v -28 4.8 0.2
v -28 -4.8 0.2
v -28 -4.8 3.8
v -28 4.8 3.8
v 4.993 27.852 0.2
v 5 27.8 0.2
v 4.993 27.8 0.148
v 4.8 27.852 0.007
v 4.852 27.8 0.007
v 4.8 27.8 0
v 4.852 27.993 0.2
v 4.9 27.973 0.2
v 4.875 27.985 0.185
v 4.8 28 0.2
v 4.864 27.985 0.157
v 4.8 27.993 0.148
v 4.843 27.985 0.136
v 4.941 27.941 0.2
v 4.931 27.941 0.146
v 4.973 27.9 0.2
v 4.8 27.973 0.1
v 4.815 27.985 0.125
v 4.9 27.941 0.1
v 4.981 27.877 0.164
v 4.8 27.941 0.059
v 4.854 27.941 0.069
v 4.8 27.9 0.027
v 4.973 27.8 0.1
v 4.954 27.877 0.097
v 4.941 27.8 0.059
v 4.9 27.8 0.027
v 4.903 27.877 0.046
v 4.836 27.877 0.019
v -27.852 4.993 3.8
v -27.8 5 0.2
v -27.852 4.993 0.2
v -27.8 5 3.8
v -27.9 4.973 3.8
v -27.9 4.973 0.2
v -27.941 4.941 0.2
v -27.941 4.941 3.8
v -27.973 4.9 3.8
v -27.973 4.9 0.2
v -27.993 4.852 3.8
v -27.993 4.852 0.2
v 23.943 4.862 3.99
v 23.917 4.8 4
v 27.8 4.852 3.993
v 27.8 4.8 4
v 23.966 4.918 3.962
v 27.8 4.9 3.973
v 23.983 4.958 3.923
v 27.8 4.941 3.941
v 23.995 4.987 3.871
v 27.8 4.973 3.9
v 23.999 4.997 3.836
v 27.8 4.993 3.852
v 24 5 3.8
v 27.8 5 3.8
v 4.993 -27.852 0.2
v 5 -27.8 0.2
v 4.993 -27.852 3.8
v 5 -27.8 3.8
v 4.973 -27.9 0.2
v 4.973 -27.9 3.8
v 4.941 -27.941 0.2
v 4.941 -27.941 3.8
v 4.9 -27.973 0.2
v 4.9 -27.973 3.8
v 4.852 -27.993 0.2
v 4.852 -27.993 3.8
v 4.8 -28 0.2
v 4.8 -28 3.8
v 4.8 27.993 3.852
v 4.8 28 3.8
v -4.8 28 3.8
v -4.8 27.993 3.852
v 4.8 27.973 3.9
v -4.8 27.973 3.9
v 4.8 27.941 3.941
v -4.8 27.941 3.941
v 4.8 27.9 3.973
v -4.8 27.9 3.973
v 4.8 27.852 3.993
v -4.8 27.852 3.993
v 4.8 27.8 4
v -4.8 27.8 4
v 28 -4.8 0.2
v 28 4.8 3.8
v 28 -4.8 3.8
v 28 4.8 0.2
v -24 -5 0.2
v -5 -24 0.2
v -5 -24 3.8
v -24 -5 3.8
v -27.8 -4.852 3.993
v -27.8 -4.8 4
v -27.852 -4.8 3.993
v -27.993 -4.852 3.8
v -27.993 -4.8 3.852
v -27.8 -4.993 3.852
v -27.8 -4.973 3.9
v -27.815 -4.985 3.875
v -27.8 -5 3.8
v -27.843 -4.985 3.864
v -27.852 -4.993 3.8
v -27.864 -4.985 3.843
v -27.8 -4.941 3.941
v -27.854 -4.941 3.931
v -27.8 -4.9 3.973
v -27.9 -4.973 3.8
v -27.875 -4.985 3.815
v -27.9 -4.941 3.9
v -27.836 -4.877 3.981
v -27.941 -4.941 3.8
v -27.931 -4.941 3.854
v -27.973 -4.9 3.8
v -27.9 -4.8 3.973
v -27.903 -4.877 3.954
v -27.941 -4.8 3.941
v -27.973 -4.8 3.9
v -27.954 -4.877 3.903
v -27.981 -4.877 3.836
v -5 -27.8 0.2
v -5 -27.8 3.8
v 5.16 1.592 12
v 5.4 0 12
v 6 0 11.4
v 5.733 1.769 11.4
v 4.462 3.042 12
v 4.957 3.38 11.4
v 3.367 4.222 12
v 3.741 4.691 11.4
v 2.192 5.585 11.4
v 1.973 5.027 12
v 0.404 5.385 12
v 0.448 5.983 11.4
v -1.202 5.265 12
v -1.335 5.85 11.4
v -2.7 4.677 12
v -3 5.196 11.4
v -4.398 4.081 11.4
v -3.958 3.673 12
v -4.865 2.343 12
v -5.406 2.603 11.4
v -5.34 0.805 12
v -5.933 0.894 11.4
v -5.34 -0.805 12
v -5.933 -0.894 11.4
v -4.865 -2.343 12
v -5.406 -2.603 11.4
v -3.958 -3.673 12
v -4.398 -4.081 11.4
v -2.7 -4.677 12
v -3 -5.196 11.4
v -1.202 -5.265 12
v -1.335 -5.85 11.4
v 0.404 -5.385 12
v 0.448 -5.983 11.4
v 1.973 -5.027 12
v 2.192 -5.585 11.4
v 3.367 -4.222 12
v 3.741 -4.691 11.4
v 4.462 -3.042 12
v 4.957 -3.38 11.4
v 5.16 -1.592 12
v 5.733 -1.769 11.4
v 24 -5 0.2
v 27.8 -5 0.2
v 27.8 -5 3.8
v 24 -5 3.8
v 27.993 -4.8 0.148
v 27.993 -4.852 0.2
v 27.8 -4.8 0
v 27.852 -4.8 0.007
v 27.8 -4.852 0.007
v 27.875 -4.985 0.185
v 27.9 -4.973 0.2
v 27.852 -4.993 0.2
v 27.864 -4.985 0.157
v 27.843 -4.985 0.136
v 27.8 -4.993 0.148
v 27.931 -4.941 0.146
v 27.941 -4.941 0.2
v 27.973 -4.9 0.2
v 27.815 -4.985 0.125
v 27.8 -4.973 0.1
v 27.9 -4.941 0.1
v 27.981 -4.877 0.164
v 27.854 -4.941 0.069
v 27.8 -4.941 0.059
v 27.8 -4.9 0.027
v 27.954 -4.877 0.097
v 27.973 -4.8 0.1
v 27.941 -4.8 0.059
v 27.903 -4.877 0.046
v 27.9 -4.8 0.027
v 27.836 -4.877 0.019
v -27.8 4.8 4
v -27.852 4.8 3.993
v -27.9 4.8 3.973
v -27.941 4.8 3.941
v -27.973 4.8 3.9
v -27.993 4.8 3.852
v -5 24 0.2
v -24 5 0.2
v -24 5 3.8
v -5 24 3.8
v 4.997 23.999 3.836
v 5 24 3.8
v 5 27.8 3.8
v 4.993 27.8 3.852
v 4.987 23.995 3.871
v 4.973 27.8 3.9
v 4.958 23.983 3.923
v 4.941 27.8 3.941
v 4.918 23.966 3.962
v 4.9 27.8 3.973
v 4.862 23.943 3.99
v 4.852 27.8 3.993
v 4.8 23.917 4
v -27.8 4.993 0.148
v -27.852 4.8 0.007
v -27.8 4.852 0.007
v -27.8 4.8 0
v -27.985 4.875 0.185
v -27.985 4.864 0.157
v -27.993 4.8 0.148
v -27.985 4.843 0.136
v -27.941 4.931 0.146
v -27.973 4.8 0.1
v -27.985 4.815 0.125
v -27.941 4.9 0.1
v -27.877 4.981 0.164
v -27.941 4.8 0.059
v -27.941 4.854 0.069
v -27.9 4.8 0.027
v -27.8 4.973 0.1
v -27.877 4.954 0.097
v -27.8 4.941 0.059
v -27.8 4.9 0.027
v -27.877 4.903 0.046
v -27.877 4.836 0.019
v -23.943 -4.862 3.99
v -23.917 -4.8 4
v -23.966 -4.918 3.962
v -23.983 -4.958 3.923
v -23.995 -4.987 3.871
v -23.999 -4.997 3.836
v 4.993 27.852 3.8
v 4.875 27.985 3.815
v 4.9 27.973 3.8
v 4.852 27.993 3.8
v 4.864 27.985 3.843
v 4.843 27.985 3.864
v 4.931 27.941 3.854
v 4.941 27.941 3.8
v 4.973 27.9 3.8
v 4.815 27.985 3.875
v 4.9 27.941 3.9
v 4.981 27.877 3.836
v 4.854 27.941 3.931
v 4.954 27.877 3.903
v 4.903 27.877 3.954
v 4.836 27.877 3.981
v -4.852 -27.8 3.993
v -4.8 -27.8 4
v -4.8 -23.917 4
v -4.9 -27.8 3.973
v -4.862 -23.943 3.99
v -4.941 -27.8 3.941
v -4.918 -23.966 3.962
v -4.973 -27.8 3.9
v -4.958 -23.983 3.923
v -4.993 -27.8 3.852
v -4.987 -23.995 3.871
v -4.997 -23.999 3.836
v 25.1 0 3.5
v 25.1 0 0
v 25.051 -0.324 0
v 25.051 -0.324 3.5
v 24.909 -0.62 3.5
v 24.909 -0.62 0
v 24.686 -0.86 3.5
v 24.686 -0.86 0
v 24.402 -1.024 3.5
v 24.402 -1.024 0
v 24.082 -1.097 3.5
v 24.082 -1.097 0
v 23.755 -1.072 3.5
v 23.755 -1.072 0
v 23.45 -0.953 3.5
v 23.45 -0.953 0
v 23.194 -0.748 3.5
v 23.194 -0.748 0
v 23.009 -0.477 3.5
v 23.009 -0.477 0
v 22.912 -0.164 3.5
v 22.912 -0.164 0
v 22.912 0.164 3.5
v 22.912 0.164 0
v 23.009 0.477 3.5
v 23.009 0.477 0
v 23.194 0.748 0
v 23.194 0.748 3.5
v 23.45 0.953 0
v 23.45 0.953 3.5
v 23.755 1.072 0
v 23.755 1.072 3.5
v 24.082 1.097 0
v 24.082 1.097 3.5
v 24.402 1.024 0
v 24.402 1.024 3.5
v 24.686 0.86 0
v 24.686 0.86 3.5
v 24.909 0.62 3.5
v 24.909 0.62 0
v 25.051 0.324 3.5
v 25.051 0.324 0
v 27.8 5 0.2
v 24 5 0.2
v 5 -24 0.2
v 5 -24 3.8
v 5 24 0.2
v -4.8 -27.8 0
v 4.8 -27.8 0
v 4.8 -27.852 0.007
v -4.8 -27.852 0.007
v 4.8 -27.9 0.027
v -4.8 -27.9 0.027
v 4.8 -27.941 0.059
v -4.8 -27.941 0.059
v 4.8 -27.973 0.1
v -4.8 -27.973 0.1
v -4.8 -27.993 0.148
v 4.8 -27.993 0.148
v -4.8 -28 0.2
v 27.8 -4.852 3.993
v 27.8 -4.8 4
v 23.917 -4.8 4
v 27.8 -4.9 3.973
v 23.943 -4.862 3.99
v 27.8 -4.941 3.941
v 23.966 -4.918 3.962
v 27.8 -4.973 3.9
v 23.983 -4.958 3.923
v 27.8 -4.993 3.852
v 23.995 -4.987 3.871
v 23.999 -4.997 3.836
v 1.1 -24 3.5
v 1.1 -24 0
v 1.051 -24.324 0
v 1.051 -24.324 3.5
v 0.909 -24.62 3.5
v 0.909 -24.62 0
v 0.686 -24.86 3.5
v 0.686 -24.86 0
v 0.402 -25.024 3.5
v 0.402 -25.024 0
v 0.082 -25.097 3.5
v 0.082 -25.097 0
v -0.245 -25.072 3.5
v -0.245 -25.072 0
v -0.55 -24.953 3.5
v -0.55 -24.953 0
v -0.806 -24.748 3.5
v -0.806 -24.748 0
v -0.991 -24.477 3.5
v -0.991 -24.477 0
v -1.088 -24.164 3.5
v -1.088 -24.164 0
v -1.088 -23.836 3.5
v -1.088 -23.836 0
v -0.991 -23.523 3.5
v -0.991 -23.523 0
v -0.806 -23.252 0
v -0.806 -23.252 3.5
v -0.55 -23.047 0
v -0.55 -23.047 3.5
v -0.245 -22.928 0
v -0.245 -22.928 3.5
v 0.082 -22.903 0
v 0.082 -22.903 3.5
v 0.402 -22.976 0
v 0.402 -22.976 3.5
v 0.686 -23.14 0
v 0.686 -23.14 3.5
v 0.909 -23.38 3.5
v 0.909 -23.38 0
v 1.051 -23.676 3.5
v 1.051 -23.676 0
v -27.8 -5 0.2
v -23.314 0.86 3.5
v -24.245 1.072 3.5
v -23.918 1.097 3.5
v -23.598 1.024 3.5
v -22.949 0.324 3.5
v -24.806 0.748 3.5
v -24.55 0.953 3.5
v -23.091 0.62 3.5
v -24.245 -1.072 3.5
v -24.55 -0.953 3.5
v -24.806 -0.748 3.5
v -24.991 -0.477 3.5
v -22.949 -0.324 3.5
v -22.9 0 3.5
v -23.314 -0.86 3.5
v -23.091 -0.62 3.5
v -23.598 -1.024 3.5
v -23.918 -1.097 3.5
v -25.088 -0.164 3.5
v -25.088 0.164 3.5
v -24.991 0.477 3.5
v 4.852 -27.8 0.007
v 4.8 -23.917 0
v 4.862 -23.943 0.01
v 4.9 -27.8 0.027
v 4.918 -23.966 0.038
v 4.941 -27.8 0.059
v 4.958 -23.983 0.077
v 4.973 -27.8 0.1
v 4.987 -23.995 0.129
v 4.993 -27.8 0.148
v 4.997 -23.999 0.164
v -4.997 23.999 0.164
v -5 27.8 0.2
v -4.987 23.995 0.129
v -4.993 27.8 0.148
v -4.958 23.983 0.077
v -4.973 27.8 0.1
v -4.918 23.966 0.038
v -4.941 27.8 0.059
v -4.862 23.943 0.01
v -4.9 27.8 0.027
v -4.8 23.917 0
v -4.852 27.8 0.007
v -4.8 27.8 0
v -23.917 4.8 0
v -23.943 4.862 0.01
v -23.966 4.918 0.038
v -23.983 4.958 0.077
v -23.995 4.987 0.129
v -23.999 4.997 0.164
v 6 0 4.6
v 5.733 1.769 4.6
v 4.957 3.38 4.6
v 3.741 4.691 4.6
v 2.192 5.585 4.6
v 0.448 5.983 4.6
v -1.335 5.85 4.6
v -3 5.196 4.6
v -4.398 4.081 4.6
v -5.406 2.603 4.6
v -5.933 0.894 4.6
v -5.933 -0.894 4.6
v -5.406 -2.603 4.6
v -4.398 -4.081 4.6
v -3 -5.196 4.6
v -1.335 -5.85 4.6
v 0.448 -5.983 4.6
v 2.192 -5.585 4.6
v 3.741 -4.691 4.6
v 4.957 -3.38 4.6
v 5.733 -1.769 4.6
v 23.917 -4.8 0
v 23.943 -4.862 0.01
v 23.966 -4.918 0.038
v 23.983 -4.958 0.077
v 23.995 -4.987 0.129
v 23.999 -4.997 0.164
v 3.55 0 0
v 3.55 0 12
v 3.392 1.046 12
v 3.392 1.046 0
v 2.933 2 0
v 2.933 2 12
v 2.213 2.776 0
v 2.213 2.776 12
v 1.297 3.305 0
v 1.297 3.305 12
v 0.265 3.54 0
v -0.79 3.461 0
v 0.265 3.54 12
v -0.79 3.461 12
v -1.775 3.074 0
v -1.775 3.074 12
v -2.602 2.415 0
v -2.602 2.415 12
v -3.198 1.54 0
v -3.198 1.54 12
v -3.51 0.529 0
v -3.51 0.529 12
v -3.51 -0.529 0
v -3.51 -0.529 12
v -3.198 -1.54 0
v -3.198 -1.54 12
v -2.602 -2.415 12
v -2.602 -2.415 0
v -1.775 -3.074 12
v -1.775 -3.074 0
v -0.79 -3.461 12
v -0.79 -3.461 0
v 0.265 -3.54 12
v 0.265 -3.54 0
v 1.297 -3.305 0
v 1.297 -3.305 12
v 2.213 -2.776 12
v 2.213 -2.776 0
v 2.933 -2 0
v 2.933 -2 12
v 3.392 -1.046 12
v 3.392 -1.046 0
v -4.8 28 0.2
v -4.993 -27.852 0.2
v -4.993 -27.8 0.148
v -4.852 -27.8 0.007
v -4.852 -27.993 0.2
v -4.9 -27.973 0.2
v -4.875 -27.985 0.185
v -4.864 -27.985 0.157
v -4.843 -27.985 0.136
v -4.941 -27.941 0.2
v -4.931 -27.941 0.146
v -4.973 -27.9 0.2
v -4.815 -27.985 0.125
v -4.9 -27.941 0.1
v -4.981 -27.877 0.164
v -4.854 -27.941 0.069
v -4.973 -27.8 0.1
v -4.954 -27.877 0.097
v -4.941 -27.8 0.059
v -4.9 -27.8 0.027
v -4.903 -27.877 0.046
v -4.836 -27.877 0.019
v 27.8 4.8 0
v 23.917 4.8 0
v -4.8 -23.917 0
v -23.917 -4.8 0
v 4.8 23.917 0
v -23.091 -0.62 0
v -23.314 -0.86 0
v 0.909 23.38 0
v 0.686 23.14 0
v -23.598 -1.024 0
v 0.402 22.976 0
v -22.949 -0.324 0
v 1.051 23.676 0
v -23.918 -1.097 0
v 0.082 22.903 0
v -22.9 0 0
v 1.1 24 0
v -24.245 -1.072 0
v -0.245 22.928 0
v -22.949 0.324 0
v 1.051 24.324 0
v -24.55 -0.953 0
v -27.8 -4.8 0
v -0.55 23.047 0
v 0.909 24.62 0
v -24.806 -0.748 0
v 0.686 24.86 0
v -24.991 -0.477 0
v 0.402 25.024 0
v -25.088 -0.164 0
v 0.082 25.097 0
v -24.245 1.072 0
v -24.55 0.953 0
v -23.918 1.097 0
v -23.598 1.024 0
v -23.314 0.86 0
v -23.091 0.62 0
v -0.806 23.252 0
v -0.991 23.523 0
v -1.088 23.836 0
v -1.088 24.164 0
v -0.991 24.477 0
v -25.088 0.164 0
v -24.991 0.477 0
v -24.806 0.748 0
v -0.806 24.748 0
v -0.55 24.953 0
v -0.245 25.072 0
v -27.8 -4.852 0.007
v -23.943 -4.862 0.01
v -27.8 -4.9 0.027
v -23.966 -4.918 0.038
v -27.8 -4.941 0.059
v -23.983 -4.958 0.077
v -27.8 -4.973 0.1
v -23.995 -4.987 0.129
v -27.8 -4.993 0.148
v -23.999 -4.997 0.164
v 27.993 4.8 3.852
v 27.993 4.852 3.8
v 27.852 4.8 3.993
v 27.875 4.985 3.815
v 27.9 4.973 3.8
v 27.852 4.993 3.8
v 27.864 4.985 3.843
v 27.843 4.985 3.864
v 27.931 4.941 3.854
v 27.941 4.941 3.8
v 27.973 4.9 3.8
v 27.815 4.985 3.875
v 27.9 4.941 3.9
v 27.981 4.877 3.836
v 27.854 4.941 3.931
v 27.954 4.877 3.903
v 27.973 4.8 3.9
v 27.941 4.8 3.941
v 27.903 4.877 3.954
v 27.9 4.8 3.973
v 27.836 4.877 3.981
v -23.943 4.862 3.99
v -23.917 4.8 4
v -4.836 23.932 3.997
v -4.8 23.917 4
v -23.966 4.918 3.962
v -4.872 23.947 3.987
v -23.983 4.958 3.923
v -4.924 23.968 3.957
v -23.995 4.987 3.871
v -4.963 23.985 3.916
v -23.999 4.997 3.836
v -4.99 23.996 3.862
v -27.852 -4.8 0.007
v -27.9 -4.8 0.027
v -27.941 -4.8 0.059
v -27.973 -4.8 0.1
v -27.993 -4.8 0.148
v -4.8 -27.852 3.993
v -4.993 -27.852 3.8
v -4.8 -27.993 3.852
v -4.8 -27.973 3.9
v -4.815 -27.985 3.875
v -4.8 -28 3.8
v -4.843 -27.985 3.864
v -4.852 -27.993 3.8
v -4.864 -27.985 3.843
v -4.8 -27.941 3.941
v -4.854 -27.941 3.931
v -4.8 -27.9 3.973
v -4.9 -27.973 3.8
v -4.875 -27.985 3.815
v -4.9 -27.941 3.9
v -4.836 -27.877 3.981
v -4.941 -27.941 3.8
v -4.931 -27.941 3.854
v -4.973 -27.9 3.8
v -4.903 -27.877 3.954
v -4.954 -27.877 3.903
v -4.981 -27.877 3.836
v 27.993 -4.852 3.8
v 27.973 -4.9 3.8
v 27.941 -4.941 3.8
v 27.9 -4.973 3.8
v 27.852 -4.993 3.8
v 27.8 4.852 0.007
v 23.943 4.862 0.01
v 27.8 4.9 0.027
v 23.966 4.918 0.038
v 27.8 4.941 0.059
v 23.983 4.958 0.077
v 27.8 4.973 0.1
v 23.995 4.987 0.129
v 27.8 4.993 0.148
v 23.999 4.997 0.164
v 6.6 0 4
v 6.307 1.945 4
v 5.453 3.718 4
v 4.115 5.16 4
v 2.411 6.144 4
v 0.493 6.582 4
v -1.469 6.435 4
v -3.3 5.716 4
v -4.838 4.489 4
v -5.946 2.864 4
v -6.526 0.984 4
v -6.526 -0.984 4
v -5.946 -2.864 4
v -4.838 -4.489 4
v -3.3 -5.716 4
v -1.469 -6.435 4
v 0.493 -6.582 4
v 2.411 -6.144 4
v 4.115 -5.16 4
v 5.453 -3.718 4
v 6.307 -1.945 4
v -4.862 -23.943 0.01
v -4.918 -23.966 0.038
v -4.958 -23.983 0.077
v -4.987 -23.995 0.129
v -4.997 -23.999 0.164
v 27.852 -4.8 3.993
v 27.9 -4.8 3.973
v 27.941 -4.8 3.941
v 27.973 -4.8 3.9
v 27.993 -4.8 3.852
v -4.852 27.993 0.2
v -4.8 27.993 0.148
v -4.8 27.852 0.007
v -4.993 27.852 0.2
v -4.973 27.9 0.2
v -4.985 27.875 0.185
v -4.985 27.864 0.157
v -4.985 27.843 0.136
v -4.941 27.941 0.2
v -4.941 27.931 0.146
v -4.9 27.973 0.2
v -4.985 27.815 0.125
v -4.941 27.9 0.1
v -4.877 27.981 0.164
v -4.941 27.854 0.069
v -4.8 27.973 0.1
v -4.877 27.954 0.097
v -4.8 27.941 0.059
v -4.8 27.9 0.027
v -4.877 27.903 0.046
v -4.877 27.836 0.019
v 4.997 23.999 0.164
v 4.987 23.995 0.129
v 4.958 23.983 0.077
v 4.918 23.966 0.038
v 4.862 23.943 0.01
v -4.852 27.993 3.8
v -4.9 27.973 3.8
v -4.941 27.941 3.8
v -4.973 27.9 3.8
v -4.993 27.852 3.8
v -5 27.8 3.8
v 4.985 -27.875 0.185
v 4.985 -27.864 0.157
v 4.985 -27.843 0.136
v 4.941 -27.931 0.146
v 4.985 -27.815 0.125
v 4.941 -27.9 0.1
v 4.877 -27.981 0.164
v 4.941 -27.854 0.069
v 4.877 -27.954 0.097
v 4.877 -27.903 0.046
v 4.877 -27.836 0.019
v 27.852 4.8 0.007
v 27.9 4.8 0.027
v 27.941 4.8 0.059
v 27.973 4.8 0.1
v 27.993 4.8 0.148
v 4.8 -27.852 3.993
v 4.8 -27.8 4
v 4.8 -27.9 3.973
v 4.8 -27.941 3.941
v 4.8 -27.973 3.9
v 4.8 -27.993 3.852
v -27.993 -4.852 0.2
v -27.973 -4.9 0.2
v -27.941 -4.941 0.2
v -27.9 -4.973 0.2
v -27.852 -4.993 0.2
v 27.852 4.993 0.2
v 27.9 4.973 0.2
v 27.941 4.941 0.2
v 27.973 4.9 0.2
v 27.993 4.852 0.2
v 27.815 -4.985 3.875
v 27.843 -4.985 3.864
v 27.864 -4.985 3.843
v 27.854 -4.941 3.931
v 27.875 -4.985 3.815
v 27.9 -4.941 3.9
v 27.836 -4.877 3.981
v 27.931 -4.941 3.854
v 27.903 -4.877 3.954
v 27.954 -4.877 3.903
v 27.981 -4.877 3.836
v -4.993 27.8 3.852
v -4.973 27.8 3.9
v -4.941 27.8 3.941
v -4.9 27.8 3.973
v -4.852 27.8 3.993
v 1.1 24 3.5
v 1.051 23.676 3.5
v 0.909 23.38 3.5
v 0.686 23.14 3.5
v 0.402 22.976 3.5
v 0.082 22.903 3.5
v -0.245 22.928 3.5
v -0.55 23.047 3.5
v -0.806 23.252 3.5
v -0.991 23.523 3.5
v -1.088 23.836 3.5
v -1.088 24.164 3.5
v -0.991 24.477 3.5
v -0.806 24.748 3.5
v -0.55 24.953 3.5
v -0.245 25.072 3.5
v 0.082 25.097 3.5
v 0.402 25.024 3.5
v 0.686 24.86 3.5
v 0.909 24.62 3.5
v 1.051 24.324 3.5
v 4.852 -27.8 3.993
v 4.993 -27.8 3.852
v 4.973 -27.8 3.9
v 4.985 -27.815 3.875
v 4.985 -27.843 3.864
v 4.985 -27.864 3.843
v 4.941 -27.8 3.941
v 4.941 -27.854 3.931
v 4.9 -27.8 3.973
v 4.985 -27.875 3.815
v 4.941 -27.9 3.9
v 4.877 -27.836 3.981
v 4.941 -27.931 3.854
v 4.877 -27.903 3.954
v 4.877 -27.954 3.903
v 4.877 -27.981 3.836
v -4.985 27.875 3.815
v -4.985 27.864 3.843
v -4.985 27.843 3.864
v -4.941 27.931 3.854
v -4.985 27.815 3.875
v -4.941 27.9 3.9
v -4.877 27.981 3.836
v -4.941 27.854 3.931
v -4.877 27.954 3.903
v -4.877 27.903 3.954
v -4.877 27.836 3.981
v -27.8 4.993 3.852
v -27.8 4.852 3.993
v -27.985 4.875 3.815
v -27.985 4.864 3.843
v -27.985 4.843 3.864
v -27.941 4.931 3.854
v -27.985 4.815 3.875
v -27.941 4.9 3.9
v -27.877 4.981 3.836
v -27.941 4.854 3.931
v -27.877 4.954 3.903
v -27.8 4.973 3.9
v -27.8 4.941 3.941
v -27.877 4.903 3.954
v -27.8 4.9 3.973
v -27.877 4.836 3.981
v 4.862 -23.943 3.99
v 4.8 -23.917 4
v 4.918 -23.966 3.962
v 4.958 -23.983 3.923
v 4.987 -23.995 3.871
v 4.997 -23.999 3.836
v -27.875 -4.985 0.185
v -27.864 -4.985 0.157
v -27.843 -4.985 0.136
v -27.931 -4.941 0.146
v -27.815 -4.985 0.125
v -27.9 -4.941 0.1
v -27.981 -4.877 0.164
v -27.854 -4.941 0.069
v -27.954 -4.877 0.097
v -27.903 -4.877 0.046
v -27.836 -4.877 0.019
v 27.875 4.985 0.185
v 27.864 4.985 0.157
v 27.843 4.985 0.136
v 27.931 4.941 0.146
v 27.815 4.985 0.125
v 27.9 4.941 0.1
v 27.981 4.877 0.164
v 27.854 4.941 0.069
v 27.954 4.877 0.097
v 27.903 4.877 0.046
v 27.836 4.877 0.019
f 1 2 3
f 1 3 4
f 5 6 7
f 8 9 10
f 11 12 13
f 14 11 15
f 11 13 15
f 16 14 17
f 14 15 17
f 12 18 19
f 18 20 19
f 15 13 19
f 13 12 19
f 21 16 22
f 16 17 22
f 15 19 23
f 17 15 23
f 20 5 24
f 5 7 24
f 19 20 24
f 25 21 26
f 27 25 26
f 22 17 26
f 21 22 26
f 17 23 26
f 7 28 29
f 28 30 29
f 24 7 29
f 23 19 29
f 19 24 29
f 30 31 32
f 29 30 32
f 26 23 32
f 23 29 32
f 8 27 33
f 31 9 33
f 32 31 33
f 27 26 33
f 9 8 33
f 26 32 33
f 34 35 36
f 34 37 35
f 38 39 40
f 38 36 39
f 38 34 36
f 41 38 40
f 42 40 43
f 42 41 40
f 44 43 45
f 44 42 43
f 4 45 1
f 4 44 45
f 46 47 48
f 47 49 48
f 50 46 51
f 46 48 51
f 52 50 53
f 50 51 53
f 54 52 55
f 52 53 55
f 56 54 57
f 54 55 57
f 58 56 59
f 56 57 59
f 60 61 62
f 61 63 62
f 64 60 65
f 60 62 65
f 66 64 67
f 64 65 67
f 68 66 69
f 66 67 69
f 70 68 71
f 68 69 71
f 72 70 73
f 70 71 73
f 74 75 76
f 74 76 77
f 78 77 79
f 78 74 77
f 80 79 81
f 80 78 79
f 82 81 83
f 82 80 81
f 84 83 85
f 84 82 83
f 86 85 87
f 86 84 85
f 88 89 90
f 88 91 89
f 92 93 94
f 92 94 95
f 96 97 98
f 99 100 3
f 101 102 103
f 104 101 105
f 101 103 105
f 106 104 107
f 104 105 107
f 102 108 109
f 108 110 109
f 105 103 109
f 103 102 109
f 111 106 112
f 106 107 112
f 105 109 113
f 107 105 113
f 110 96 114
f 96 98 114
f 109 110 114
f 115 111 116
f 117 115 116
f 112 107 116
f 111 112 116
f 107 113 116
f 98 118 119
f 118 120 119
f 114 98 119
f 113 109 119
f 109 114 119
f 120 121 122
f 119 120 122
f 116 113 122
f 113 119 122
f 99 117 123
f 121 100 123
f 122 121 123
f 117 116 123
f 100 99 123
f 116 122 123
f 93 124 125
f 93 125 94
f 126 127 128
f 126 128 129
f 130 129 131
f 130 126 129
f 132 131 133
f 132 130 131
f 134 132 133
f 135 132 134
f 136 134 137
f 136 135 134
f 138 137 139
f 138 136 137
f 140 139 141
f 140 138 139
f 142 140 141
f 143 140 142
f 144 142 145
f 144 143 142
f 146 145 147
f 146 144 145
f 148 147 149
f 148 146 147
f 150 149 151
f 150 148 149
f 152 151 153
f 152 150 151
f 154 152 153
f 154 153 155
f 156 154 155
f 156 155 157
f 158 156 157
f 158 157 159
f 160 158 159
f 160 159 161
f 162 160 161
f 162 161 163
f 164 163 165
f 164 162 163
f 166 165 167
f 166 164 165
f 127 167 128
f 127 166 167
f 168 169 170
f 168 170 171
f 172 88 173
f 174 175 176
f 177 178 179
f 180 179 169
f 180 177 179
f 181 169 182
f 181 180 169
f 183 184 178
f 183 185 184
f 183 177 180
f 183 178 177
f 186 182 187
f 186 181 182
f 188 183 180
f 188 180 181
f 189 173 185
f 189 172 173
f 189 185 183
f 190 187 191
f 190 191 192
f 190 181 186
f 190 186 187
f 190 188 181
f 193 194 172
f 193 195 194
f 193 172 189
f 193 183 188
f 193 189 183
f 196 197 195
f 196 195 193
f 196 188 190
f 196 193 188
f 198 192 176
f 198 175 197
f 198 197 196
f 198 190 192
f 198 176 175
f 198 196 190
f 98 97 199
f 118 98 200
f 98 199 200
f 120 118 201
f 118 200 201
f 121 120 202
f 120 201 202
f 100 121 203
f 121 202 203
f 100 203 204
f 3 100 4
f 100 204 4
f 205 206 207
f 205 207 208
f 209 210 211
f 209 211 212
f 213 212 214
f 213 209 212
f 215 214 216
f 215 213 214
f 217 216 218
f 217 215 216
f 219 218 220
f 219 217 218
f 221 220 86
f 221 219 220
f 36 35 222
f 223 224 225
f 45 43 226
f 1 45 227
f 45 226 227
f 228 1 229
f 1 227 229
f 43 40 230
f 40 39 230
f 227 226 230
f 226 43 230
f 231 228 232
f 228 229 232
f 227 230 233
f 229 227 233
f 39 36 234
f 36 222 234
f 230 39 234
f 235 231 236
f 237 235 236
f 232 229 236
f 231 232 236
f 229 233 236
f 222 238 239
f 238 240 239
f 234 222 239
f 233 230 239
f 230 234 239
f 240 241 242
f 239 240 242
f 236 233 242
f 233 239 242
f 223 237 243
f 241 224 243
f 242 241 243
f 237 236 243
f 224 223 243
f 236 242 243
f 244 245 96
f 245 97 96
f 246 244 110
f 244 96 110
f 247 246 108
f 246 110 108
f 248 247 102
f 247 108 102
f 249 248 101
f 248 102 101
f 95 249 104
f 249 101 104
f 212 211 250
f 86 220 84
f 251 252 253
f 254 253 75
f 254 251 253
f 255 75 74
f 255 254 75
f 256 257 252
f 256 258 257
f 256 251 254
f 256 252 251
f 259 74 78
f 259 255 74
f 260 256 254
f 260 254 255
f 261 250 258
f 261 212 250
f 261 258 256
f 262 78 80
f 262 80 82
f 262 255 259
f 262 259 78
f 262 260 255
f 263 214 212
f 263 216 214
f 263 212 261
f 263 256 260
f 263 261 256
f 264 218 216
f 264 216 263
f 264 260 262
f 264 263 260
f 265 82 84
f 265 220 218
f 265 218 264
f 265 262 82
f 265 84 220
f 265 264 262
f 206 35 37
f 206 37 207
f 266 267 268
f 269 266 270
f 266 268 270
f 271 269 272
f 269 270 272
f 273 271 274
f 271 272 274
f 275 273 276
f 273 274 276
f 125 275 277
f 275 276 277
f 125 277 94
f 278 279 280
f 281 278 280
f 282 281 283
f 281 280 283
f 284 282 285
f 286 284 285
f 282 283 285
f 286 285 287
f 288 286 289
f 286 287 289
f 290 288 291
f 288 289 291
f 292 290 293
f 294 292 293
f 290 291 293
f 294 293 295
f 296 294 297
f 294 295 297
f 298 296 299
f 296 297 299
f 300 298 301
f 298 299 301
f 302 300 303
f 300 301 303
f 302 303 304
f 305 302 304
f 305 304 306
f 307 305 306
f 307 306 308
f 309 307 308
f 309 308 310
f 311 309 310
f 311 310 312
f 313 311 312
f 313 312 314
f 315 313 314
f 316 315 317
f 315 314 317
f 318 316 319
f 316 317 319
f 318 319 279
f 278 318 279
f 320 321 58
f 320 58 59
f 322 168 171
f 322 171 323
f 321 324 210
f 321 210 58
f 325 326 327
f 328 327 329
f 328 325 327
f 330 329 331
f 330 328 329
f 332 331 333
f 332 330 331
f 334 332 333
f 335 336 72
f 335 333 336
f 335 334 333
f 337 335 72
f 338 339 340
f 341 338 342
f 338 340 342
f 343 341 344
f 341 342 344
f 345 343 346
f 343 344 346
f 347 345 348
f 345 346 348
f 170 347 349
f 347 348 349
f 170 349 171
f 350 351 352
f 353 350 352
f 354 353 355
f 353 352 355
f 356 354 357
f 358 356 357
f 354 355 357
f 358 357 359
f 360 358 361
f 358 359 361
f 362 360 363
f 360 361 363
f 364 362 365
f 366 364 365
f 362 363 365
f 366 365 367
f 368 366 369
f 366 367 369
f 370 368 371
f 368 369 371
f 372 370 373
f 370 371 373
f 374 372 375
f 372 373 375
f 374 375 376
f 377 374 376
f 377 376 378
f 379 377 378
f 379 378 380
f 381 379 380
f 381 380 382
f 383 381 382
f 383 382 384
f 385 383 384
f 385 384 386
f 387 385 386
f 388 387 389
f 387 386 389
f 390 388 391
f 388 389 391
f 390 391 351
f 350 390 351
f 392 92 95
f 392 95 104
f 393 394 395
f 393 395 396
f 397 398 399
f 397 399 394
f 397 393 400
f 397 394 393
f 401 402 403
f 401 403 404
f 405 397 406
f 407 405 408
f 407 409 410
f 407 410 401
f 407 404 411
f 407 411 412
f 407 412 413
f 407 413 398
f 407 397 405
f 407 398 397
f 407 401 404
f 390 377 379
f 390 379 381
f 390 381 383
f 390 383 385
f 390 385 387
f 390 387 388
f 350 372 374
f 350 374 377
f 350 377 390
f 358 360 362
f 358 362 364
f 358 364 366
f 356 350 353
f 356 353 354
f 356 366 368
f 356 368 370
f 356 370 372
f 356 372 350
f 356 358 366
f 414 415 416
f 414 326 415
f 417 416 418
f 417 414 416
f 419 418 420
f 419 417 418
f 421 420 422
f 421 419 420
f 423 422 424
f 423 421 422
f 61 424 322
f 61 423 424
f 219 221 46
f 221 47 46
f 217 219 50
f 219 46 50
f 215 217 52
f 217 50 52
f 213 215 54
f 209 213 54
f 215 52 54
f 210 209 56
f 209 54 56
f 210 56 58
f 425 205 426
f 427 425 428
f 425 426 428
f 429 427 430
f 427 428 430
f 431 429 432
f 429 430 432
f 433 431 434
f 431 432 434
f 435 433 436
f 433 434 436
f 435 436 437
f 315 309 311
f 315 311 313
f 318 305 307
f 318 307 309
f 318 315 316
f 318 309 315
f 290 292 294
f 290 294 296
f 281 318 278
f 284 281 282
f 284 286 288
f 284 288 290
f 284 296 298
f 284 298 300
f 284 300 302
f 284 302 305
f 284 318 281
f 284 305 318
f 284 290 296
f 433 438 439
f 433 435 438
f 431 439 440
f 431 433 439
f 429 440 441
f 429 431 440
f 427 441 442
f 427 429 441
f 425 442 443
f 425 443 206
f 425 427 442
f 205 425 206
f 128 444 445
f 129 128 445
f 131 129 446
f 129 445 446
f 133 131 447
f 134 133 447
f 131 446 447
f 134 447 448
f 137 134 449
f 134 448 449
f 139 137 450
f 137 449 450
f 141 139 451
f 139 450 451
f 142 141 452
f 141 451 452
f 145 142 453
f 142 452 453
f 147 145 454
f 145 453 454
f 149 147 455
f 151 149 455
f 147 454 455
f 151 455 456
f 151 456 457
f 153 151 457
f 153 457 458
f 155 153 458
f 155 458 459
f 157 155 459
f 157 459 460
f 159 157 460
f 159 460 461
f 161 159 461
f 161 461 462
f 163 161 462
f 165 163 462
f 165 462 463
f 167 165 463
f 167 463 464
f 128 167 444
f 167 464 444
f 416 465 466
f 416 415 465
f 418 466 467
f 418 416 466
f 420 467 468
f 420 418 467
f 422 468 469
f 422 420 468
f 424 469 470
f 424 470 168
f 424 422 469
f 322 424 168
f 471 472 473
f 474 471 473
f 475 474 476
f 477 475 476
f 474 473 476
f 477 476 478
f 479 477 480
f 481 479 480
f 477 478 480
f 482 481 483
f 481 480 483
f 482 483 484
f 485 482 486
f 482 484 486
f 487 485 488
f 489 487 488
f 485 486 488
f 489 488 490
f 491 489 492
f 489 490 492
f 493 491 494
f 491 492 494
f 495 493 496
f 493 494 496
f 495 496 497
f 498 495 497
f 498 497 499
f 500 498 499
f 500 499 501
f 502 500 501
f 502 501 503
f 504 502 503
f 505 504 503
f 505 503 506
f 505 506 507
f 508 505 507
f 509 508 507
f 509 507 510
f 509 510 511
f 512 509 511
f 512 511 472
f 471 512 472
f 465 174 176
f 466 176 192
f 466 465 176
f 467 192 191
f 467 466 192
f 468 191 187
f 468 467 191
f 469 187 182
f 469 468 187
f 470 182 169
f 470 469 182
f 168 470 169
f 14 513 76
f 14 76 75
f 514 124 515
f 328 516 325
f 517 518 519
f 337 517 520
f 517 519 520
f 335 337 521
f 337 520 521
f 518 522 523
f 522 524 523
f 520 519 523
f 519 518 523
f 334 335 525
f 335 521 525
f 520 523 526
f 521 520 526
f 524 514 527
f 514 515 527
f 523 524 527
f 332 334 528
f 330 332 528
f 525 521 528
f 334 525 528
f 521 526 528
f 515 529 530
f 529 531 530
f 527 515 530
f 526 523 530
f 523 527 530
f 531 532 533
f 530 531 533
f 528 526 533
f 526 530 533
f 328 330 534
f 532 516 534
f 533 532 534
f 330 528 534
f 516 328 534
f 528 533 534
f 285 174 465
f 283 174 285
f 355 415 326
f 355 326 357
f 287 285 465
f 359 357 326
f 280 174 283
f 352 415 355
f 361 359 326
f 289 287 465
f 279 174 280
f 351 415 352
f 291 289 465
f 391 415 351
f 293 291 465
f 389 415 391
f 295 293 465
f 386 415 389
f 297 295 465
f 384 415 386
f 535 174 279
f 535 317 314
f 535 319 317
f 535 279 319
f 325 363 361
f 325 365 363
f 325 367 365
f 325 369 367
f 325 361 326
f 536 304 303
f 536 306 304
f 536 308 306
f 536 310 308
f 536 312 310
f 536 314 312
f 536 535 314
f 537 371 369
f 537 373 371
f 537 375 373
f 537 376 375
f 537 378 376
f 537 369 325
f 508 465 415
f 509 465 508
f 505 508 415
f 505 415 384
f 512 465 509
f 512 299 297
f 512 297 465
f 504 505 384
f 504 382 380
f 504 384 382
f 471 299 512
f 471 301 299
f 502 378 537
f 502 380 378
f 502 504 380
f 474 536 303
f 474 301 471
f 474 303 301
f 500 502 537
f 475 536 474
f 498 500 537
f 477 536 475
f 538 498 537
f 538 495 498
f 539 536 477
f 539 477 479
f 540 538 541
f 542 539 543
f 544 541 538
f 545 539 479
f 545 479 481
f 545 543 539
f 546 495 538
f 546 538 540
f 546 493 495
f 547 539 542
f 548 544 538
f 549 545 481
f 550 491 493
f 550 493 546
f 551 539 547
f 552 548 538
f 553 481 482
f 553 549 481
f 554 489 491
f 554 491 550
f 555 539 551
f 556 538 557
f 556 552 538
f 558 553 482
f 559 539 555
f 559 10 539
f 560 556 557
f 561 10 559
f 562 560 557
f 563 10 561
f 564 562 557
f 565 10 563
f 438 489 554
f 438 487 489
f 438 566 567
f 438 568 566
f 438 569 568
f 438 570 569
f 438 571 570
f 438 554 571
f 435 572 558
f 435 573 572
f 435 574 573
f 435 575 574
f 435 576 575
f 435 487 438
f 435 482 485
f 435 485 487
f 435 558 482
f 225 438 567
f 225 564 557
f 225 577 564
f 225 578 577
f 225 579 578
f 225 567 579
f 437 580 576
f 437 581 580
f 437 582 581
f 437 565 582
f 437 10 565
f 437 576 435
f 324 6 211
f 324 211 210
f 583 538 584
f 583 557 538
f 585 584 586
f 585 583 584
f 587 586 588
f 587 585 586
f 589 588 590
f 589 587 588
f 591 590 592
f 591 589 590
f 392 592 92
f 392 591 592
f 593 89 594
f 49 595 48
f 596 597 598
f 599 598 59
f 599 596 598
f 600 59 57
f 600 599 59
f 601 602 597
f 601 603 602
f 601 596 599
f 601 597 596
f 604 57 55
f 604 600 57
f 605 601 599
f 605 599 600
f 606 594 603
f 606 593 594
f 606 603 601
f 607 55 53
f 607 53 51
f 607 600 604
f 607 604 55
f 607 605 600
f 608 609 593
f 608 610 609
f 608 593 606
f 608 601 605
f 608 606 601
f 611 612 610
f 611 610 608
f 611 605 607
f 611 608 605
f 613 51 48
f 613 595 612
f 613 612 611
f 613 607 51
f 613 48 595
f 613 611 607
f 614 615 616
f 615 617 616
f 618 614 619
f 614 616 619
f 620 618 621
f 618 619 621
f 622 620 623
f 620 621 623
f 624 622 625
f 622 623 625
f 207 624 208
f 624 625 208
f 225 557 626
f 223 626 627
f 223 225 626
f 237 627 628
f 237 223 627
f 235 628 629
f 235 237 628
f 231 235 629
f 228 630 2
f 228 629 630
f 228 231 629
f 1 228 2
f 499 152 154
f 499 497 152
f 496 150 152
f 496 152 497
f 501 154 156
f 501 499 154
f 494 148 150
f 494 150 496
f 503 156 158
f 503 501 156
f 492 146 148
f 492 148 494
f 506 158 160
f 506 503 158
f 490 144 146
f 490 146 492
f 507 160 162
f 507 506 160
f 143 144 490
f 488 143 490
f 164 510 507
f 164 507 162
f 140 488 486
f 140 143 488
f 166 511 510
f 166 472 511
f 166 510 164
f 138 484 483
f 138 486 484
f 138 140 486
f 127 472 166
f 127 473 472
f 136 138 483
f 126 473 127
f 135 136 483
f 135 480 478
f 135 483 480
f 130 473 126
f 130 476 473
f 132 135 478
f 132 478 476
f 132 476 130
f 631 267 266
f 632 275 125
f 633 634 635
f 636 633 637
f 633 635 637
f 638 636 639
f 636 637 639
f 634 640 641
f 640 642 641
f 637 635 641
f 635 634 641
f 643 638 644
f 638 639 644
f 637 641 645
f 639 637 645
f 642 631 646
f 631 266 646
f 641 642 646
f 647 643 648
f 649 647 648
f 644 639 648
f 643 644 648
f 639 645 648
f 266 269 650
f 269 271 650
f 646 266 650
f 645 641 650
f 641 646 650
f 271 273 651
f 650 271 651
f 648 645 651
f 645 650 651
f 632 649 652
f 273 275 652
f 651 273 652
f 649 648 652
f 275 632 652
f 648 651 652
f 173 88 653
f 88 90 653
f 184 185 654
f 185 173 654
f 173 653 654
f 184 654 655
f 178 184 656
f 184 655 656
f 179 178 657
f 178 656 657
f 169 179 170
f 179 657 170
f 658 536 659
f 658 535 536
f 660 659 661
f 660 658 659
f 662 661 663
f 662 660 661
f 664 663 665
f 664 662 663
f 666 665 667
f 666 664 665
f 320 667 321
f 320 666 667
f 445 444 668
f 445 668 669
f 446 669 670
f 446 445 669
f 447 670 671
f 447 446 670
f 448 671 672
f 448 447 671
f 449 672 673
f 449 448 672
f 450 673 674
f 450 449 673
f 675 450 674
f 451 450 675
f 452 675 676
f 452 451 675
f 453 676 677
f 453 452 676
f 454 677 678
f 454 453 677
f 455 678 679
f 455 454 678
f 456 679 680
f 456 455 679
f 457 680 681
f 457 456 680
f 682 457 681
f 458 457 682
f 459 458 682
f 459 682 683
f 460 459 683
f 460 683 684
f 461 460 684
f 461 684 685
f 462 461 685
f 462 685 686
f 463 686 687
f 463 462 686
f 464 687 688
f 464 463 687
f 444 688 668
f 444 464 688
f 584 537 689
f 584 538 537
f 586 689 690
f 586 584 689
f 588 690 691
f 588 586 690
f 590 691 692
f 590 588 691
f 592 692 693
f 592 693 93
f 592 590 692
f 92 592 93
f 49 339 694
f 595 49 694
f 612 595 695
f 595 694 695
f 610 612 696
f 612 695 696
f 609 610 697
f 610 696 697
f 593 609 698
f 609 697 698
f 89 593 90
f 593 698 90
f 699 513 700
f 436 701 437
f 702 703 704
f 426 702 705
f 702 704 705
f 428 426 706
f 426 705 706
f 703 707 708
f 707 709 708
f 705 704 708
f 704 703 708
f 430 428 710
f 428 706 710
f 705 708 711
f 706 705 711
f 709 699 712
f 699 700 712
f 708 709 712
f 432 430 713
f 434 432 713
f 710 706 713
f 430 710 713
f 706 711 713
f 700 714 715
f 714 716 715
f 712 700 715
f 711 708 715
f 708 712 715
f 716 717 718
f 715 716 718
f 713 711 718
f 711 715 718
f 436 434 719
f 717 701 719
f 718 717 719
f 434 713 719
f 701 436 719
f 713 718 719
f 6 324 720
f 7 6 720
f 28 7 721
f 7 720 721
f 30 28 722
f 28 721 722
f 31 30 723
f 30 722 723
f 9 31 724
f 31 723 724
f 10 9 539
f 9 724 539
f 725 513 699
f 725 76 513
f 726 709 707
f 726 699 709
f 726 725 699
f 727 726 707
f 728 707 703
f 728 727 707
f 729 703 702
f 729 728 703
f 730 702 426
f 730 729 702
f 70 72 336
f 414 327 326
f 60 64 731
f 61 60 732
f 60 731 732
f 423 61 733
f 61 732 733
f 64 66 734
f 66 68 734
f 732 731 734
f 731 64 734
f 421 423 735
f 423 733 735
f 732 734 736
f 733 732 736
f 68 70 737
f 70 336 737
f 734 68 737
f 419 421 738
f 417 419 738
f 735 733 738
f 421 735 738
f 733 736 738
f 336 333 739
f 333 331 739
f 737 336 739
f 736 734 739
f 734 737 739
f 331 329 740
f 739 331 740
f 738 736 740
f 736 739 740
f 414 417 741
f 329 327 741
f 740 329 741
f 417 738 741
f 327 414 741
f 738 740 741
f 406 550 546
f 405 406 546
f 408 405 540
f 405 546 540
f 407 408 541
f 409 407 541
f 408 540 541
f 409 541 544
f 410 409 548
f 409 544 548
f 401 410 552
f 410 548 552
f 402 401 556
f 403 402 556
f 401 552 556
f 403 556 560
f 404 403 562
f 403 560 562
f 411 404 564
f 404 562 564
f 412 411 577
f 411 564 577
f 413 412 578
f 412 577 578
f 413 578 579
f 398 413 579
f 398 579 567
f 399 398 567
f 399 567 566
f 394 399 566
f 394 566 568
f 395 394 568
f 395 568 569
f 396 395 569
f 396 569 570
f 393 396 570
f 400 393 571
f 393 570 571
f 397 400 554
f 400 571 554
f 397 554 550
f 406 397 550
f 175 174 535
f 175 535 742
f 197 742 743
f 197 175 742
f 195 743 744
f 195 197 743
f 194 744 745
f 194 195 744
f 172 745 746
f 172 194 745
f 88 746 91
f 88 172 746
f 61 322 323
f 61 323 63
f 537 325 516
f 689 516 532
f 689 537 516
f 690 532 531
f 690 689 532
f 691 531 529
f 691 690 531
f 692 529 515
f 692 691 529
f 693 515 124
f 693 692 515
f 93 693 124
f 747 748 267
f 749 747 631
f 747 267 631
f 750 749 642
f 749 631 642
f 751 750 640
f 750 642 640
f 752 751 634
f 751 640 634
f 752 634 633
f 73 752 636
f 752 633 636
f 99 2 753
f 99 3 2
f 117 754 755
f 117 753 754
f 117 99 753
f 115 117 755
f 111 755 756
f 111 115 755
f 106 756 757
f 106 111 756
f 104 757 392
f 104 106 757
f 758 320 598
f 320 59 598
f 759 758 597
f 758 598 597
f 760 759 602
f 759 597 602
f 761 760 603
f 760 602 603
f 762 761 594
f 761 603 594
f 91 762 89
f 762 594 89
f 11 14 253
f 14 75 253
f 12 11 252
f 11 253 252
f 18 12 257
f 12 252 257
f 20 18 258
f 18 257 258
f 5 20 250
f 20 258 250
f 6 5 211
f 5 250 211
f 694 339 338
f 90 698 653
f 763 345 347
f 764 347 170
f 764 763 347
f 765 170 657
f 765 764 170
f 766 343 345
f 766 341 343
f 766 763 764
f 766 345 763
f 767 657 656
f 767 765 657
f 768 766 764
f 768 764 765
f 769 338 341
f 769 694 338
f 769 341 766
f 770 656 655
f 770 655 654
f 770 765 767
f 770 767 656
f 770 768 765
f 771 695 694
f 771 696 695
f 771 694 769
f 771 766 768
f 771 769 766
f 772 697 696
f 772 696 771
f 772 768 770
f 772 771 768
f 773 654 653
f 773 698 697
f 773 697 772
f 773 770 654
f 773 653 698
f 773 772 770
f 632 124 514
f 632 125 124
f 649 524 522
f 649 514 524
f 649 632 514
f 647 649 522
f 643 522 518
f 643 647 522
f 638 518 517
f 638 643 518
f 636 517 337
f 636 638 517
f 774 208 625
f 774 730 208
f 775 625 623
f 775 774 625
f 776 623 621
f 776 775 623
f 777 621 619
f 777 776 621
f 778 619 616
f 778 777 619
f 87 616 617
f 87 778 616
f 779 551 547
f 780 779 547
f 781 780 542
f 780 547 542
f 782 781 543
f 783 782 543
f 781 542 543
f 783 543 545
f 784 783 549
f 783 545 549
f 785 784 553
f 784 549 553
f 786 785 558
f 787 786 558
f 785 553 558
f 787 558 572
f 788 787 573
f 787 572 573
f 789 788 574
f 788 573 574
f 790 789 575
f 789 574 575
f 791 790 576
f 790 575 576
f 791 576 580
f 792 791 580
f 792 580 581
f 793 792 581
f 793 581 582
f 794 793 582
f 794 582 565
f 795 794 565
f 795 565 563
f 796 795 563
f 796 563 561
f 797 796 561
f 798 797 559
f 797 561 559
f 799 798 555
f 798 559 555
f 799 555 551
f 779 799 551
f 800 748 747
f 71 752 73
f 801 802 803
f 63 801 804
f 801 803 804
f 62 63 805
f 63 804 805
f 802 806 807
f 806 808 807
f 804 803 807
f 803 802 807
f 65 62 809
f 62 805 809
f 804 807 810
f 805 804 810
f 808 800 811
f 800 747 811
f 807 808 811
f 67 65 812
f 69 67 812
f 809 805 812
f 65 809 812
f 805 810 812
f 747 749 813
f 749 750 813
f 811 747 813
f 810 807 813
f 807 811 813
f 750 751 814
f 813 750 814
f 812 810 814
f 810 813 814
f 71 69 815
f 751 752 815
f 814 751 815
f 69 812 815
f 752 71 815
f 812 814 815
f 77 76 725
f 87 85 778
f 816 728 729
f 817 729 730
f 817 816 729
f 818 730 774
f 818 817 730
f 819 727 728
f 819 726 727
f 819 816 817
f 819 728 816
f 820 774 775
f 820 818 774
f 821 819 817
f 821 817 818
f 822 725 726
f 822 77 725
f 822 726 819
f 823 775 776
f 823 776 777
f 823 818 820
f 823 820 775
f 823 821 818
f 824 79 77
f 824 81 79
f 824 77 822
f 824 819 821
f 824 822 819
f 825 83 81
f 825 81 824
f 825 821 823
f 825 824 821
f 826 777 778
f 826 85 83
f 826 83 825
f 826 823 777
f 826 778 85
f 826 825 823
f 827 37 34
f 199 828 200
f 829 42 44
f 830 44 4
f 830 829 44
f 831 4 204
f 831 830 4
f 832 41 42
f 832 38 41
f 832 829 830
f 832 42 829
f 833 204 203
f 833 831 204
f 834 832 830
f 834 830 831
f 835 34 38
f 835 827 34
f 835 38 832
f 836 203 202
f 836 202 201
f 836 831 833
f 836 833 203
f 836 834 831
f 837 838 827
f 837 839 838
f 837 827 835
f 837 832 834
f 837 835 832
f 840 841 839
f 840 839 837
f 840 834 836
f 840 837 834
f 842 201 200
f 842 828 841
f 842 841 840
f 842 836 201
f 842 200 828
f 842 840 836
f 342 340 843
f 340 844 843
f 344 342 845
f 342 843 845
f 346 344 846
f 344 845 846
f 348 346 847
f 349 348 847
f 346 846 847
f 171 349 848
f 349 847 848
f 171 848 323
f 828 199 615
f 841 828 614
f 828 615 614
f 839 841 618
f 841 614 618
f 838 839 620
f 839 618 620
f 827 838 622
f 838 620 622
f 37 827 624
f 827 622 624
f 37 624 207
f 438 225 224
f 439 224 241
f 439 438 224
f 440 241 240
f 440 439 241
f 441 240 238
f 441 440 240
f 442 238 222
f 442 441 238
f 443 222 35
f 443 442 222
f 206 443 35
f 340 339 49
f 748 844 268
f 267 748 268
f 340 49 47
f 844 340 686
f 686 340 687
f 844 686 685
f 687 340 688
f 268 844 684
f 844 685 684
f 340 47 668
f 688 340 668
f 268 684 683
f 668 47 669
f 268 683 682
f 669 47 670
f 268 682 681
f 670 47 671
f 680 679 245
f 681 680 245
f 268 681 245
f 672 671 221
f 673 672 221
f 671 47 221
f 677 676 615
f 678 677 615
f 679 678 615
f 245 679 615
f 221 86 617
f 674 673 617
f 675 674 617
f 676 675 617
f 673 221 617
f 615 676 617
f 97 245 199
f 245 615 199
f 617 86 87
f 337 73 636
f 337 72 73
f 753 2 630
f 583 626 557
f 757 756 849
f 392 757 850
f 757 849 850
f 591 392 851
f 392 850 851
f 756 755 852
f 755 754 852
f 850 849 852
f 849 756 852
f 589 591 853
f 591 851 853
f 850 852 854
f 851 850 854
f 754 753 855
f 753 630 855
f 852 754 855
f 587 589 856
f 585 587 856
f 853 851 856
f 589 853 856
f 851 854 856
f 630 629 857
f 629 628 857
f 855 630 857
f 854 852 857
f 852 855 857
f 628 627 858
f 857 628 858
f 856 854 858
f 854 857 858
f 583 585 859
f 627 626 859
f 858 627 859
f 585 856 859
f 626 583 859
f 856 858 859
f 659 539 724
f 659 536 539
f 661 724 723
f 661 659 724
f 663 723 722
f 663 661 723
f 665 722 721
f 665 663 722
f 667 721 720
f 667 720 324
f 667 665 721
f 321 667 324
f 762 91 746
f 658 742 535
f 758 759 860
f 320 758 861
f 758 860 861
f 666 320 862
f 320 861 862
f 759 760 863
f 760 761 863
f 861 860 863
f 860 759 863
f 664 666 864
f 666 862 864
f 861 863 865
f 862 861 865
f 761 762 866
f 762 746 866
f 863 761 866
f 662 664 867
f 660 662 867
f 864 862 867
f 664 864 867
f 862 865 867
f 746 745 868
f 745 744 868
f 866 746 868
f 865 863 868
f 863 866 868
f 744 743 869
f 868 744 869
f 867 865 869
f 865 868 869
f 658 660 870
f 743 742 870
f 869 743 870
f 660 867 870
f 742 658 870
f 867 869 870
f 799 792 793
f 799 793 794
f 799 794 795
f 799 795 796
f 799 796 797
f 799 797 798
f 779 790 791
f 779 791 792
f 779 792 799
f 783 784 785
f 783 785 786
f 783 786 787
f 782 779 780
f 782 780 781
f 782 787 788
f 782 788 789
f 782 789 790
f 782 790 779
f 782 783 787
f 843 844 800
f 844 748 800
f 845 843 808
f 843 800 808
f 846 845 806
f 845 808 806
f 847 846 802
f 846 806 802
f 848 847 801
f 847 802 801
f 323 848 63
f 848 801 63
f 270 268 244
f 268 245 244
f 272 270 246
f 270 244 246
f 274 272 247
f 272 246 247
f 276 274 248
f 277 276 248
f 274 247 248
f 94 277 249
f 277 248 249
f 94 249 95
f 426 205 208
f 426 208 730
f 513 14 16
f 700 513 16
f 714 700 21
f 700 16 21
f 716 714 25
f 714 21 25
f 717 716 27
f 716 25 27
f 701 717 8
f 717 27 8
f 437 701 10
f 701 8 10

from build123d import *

# Parameters (mm, degrees)
PAD_DEPTH       = 4
SKETCH_R        = 6
PAD001_DEPTH    = 8
SKETCH002_R     = 3.55
POCKET_DEPTH    = 20
SKETCH003_R     = 1.1
POCKET001_DEPTH = 3.5
FILLET_R        = 0.2
CHAMFER_SIZE    = 0.6


with BuildPart() as part:
    # Sketch001 → Pad (new body)
    with BuildSketch(Plane.XY):
        Polygon((-5, 28), (5, 28), (5, 24), (24, 5), (28, 5), (28, -5), (24, -5), (5, -24), (5, -28), (-5, -28), (-5, -24), (-24, -5), (-28, -5), (-28, 5), (-24, 5), (-5, 24), align=None)
    extrude(amount=PAD_DEPTH)

    # Sketch (on Face18 of Pad) → Pad001 (join)
    with BuildSketch(Plane.XY.offset(4)):
        Circle(SKETCH_R)
    extrude(amount=PAD001_DEPTH)

    # Sketch002 (on Face20 of Pad001) → Pocket (cut)
    with BuildSketch(Plane.XY.offset(12)):
        Circle(SKETCH002_R)
    extrude(amount=-POCKET_DEPTH, mode=Mode.SUBTRACT)

    # Sketch003 (on Face4 of Pocket) → Pocket001 (cut)
    with BuildSketch(Plane(origin=(0, 0, 0), x_dir=(1, 0, 0), z_dir=(0, 0, -1))):
        with Locations((0, 24)):
            Circle(SKETCH003_R)
        with Locations((24, 0)):
            Circle(SKETCH003_R)
        with Locations((-24, 0)):
            Circle(SKETCH003_R)
        with Locations((0, -24)):
            Circle(SKETCH003_R)
    extrude(amount=-POCKET001_DEPTH, mode=Mode.SUBTRACT)

    # Fillet
    fillet_edges = [part.edges().sort_by_distance(p)[0] for p in [
        (28, 0, 4),
        (28, 0, 0),
        (28, 5, 2),
        (26, 5, 4),
        (14.5, 14.5, 4),
        (26, 5, 0),
        (14.5, 14.5, 0),
        (5, 26, 4),
        (5, 26, 0),
        (5, 28, 2),
        (0, 28, 4),
        (0, 28, 0),
        (-5, 28, 2),
        (-5, 26, 4),
        (-14.5, 14.5, 4),
        (-14.5, 14.5, 0),
        (-26, 5, 0),
        (-26, 5, 4),
        (-28, 5, 2),
        (-28, 0, 4),
        (-26, -5, 4),
        (-14.5, -14.5, 4),
        (-5, -26, 4),
        (0, -28, 4),
        (5, -26, 4),
        (14.5, -14.5, 4),
        (26, -5, 4),
        (28, -5, 2),
        (-28, 0, 0),
        (-28, -5, 2),
        (-26, -5, 0),
        (-14.5, -14.5, 0),
        (-5, -26, 0),
        (-5, -28, 2),
        (0, -28, 0),
        (5, -28, 2),
        (14.5, -14.5, 0),
        (5, -26, 0),
        (26, -5, 0),
        (-5, 26, 0),
    ]]
    fillet(fillet_edges, radius=FILLET_R)

    # Chamfer
    chamfer_edges = [part.edges().sort_by_distance(p)[0] for p in [
        (6, 0, 8),
        (-6, 0, 4),
        (-6, 0, 12),
    ]]
    chamfer(chamfer_edges, length=CHAMFER_SIZE)


solid = part.part
